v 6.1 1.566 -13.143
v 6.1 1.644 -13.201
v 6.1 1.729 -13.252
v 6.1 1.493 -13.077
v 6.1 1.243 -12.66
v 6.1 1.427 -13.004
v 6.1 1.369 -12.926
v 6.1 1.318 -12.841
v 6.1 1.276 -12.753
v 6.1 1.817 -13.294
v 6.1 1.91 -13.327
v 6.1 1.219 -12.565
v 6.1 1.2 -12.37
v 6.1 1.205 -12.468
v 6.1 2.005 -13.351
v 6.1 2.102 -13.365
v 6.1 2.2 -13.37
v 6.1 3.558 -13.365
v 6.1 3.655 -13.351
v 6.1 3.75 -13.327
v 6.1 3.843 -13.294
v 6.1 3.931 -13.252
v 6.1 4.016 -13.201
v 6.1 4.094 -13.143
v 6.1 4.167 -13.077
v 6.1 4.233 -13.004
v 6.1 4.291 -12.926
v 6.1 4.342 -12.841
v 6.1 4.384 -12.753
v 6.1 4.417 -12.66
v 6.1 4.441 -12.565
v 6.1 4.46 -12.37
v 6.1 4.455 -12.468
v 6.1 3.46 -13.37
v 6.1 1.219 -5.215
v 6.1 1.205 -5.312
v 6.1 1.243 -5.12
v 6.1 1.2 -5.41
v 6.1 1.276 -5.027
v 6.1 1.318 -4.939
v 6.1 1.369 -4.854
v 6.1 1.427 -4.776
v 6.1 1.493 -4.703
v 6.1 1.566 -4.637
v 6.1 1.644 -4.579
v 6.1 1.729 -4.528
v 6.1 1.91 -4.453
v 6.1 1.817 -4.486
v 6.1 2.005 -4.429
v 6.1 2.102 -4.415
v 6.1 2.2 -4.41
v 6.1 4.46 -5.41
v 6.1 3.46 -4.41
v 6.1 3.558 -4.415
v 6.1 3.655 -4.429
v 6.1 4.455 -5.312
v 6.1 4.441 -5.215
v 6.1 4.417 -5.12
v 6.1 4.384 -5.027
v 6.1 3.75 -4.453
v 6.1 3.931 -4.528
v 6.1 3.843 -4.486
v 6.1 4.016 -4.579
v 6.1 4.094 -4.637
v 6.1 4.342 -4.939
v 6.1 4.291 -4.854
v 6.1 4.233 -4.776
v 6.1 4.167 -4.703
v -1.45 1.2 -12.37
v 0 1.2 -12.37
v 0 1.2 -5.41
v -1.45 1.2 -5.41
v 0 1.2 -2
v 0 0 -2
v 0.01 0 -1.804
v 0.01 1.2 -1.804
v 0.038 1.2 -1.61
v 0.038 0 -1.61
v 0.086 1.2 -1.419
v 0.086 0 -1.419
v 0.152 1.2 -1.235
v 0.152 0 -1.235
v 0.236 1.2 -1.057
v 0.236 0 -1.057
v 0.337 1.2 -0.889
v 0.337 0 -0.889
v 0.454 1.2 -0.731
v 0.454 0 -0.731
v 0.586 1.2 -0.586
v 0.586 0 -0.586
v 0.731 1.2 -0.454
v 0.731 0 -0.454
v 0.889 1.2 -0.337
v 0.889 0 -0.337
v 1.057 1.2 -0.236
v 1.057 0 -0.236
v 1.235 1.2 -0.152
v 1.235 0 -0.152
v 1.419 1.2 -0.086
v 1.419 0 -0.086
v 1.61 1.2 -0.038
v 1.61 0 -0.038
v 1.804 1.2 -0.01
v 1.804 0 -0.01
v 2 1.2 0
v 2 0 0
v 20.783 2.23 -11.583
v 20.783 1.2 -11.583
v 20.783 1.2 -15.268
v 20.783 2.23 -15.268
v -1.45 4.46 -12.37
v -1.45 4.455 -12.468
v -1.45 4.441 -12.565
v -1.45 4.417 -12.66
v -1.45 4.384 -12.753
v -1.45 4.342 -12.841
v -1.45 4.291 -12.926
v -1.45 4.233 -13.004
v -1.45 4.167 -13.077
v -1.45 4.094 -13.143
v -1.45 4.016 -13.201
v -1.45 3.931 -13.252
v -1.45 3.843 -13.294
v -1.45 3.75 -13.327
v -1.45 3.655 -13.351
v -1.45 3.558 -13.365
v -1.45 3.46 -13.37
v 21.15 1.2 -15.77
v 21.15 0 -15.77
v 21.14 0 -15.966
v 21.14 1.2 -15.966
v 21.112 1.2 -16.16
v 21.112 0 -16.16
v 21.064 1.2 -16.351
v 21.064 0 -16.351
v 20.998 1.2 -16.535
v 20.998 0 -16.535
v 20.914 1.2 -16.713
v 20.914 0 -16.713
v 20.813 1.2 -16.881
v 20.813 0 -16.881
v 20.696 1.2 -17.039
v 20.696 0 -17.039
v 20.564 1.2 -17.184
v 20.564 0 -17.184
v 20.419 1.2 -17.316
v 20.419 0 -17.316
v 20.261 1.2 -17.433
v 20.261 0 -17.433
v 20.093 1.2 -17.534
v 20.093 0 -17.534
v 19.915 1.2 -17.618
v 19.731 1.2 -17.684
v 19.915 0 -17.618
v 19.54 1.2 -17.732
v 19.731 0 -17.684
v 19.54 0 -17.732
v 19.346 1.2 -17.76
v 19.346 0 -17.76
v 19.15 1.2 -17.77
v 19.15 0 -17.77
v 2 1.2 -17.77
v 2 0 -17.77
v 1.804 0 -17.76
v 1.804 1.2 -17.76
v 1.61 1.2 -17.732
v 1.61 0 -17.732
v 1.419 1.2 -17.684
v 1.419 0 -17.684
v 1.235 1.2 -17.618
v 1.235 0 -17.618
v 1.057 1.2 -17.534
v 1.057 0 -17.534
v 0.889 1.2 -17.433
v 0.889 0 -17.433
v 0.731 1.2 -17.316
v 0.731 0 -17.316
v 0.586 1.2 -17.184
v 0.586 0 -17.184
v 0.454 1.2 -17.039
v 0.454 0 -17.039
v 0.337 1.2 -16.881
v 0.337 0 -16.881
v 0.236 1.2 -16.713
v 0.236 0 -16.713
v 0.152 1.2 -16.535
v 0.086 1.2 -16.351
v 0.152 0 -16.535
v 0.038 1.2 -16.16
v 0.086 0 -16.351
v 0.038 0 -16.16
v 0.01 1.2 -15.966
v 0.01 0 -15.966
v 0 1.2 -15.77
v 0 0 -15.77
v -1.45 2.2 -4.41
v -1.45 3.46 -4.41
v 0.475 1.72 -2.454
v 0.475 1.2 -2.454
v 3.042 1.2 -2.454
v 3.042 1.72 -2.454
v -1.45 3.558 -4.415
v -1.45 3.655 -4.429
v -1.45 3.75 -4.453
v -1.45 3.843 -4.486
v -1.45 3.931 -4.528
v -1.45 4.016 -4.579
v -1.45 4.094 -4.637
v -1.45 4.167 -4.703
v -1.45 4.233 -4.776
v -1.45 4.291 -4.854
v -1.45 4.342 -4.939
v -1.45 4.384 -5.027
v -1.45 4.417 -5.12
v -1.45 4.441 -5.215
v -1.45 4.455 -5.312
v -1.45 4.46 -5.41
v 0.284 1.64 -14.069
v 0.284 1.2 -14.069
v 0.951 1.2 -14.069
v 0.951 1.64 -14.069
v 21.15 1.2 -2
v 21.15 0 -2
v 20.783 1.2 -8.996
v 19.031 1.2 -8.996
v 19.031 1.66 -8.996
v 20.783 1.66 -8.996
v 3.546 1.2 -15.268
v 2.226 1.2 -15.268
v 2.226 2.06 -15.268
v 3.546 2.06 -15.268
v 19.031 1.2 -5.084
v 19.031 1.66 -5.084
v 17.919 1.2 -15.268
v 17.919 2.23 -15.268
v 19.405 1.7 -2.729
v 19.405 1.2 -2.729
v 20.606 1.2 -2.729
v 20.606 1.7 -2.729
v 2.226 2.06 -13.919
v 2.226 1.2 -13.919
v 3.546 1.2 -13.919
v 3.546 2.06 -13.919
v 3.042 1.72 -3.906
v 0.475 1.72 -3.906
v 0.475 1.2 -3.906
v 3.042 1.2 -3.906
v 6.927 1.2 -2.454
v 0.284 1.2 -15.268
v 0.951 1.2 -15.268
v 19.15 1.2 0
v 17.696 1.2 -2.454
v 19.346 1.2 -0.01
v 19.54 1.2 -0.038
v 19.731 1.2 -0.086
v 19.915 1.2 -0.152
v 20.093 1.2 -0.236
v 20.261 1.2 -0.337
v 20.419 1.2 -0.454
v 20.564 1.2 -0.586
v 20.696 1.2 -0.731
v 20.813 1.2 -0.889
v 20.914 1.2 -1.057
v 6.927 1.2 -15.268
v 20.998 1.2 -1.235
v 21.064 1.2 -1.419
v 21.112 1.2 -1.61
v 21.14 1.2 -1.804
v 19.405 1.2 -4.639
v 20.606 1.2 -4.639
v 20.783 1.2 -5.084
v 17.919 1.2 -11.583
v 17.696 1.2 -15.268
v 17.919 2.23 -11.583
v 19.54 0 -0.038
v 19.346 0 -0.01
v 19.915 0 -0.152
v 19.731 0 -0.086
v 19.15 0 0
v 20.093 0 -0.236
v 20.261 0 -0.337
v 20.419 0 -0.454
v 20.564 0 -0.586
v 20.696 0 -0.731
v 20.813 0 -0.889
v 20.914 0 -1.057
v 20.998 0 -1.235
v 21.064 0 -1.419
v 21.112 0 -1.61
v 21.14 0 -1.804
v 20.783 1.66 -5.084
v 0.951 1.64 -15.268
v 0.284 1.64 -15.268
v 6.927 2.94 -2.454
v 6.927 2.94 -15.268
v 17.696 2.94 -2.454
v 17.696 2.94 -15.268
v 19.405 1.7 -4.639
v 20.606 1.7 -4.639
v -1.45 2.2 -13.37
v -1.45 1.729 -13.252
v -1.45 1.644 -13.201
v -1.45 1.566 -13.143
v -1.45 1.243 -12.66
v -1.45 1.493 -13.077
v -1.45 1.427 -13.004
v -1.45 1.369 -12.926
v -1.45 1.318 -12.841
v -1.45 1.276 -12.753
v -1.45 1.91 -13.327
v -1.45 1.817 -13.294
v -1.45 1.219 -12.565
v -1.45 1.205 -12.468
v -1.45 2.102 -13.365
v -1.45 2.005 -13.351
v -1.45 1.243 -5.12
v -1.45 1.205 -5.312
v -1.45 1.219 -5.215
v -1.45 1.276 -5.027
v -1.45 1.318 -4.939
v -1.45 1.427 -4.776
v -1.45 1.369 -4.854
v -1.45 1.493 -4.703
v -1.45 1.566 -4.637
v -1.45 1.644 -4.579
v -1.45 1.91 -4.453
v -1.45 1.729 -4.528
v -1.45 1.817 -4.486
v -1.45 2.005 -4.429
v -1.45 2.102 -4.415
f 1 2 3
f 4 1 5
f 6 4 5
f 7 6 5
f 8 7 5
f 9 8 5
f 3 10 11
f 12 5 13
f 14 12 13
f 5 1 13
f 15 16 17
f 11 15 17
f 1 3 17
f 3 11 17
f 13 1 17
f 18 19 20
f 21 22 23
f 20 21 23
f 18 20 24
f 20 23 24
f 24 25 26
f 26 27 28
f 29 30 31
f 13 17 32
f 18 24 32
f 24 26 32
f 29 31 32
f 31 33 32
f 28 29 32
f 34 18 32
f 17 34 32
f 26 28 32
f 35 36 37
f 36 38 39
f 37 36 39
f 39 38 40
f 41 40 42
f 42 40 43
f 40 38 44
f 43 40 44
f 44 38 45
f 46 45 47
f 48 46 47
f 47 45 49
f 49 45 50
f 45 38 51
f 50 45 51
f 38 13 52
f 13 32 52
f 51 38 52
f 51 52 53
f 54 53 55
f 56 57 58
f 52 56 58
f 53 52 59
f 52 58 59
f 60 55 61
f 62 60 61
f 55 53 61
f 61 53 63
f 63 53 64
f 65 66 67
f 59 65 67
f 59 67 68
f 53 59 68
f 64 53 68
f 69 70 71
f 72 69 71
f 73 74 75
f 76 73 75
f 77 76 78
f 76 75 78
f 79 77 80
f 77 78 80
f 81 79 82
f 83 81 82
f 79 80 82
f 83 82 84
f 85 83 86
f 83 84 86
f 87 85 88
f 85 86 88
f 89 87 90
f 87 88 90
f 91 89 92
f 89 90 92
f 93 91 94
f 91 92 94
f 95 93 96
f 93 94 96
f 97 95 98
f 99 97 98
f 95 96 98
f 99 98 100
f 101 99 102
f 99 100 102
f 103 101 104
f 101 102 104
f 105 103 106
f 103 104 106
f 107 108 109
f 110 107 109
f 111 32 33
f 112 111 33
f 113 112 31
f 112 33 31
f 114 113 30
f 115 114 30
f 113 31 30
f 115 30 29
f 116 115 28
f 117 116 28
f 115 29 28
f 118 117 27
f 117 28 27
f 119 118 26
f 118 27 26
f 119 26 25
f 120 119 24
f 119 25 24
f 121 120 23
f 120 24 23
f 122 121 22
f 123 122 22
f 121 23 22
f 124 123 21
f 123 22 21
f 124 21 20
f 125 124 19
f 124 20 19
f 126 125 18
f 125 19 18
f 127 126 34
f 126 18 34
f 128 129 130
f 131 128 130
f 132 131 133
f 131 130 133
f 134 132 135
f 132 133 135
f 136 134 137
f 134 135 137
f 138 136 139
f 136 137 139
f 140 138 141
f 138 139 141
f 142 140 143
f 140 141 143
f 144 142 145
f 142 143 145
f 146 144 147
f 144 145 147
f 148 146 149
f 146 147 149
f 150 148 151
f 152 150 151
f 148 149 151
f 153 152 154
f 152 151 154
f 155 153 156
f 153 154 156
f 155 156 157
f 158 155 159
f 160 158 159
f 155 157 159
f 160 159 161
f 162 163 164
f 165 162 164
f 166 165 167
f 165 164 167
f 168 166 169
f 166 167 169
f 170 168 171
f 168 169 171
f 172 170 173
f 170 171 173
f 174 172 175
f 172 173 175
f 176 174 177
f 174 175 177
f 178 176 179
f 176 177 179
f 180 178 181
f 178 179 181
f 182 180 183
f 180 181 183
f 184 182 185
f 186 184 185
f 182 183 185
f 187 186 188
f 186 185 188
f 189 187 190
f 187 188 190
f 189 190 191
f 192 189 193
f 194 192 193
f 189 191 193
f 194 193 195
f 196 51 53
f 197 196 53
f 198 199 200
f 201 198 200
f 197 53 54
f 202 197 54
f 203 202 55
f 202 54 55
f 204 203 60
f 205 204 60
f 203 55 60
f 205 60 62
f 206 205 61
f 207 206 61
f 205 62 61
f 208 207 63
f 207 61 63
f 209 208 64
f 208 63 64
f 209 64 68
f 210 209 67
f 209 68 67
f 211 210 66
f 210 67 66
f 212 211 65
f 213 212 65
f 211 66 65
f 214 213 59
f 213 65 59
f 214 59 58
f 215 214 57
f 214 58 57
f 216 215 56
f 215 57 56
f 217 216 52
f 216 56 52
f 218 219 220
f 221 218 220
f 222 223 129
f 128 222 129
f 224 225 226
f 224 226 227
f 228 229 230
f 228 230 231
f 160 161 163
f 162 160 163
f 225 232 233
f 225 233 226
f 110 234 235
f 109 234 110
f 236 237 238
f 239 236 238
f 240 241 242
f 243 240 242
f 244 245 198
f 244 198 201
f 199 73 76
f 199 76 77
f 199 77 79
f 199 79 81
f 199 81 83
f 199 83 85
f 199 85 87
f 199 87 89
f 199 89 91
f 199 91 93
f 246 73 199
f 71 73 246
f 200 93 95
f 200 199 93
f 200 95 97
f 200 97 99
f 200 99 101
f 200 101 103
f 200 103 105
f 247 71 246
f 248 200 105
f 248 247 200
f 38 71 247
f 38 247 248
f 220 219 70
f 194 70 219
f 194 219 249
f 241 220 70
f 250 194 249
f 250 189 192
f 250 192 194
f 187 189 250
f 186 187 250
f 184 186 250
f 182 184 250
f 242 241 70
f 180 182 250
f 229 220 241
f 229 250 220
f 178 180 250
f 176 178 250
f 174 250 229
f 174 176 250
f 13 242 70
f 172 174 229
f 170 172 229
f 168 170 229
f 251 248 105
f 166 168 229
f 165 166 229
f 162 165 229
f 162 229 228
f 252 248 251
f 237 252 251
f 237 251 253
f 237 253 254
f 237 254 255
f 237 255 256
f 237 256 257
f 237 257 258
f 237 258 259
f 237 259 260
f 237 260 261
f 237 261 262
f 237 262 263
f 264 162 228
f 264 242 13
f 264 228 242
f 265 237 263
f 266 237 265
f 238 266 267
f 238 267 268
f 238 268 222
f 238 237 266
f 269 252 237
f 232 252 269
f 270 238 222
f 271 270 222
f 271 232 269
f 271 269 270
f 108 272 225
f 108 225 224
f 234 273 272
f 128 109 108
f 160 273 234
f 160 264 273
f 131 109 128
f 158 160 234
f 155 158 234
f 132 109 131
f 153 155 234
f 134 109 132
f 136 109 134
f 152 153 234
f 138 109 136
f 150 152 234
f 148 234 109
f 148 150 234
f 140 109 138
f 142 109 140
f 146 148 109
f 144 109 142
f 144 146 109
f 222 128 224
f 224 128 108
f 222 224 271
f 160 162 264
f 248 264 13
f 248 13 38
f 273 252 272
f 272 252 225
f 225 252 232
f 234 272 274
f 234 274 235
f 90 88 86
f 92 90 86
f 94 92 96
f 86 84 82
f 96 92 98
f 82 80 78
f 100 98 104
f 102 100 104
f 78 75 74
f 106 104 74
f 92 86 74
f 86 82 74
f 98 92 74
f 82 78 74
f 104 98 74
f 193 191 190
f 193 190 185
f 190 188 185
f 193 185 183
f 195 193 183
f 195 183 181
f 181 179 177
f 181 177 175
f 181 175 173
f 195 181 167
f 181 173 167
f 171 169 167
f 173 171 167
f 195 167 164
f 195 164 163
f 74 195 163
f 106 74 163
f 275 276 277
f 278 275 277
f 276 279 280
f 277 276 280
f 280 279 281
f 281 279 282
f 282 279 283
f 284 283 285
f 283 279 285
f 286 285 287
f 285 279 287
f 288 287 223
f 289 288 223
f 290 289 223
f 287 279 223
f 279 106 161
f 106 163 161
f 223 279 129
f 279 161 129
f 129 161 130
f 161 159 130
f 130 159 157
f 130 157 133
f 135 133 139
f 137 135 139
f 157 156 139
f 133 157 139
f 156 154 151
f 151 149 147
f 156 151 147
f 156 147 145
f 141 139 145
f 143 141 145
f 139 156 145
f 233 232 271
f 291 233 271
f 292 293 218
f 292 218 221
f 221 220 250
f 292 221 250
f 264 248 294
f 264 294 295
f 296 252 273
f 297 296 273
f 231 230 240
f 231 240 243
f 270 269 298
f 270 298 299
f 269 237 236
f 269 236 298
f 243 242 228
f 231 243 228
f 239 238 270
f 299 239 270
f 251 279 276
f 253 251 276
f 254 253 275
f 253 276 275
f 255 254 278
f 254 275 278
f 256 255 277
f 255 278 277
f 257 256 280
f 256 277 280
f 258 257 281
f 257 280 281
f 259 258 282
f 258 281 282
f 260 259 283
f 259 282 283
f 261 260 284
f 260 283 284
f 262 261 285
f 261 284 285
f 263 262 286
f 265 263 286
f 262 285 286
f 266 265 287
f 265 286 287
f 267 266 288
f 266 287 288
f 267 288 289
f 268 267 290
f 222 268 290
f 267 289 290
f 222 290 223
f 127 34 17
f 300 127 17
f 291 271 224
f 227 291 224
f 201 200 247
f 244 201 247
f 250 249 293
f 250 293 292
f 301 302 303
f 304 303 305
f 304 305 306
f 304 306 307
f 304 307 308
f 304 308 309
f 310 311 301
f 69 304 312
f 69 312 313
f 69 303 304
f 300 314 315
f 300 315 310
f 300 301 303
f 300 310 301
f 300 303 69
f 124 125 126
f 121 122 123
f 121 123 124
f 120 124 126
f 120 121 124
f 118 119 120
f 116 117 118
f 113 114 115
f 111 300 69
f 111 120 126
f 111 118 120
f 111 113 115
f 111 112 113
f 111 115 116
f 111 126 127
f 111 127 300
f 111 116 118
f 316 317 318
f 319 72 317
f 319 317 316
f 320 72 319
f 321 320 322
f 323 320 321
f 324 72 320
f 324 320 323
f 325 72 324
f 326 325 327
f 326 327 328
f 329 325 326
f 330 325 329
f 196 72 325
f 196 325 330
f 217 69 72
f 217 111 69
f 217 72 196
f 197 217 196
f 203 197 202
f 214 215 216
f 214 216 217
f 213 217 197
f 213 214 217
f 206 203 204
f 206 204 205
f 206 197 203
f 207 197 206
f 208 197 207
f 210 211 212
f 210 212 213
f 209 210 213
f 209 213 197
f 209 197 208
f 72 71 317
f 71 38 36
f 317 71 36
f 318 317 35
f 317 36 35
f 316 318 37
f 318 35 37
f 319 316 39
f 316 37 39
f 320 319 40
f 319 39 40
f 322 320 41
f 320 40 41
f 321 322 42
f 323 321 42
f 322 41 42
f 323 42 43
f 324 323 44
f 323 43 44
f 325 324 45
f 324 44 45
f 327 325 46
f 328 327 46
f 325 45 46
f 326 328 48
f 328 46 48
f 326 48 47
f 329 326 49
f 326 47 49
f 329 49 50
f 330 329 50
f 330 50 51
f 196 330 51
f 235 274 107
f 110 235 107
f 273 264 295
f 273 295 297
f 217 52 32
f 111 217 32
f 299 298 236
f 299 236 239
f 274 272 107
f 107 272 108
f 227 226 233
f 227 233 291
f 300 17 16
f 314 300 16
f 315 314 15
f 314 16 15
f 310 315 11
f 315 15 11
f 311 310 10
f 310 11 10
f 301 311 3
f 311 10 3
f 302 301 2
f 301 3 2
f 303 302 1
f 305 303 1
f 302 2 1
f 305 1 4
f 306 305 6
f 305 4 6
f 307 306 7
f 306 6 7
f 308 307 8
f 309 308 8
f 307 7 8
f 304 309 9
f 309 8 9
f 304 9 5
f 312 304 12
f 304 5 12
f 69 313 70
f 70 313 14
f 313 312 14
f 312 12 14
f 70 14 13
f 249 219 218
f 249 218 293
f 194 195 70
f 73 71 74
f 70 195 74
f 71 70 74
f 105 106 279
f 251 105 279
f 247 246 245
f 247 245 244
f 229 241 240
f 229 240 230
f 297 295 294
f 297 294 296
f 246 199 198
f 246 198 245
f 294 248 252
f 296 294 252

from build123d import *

# Parameters (mm, degrees)
SKETCH_1_W            = 1.320722759
SKETCH_1_H            = 1.348576416
EXTRUDE_2_DEPTH       = 2.06
SKETCH_1_3_W          = 2.567505851
SKETCH_1_3_H          = 1.451984885
EXTRUDE_3_DEPTH       = 1.72
SKETCH_1_4_W          = 10.768406503
SKETCH_1_4_H          = 12.814051925
EXTRUDE_4_DEPTH       = 2.94
SKETCH_1_5_W          = 1.751728556
SKETCH_1_5_H          = 3.911393899
EXTRUDE_5_DEPTH       = 1.66
SKETCH_1_6_W          = 2.863837954
SKETCH_1_6_H          = 3.684536573
EXTRUDE_6_DEPTH       = 2.23
SKETCH_1_7_W          = 0.666899611
SKETCH_1_7_H          = 1.198197092
EXTRUDE_7_DEPTH       = 1.64
SKETCH_1_8_W          = 1.201543901
SKETCH_1_8_H          = 1.909822412
EXTRUDE_8_DEPTH       = 1.7
EXTRUDE_9_DEPTH       = 1.2
EXTRUDE_10_DEPTH      = 1.45
EXTRUDE_10_DEPTH_BACK = 6.1


with BuildPart() as part:
    # 草图1 → 凸台-拉伸2 (new body)
    with BuildSketch(Plane(origin=(0, 0, 0), x_dir=(1, 0, 0), z_dir=(0, 1, 0))):
        with Locations((2.886090317, 14.593344496)):
            Rectangle(SKETCH_1_W, SKETCH_1_H)
    extrude(amount=EXTRUDE_2_DEPTH)



with BuildPart() as body_2:
    # 草图1<3> → 凸台-拉伸3 (new body)
    with BuildSketch(Plane(origin=(0, 0, 0), x_dir=(1, 0, 0), z_dir=(0, 1, 0))):
        with Locations((1.758272699, 3.179573222)):
            Rectangle(SKETCH_1_3_W, SKETCH_1_3_H)
    extrude(amount=EXTRUDE_3_DEPTH)


with BuildPart() as body_3:
    # 草图1<4> → 凸台-拉伸4 (new body)
    with BuildSketch(Plane(origin=(0, 0, 0), x_dir=(1, 0, 0), z_dir=(0, 1, 0))):
        with Locations((12.311476922, 8.860606741)):
            Rectangle(SKETCH_1_4_W, SKETCH_1_4_H)
    extrude(amount=EXTRUDE_4_DEPTH)


with BuildPart() as body_4:
    # 草图1<5> → 凸台-拉伸5 (new body)
    with BuildSketch(Plane(origin=(0, 0, 0), x_dir=(1, 0, 0), z_dir=(0, 1, 0))):
        with Locations((19.907360624, 7.039973628)):
            Rectangle(SKETCH_1_5_W, SKETCH_1_5_H)
    extrude(amount=EXTRUDE_5_DEPTH)


with BuildPart() as body_5:
    # 草图1<6> → 凸台-拉伸6 (new body)
    with BuildSketch(Plane(origin=(0, 0, 0), x_dir=(1, 0, 0), z_dir=(0, 1, 0))):
        with Locations((19.351305925, 13.425364418)):
            Rectangle(SKETCH_1_6_W, SKETCH_1_6_H)
    extrude(amount=EXTRUDE_6_DEPTH)


with BuildPart() as body_6:
    # 草图1<7> → 凸台-拉伸7 (new body)
    with BuildSketch(Plane(origin=(0, 0, 0), x_dir=(1, 0, 0), z_dir=(0, 1, 0))):
        with Locations((0.617323995, 14.668534158)):
            Rectangle(SKETCH_1_7_W, SKETCH_1_7_H)
    extrude(amount=EXTRUDE_7_DEPTH)


with BuildPart() as body_7:
    # 草图1<8> → 凸台-拉伸8 (new body)
    with BuildSketch(Plane(origin=(0, 0, 0), x_dir=(1, 0, 0), z_dir=(0, 1, 0))):
        with Locations((20.00563527, 3.683898)):
            Rectangle(SKETCH_1_8_W, SKETCH_1_8_H)
    extrude(amount=EXTRUDE_8_DEPTH)


with BuildPart() as part_1:
    add(part.part)

    add(body_2.part)  # 凸台-拉伸9 merges body 2

    add(body_3.part)  # 凸台-拉伸9 merges body 3

    add(body_4.part)  # 凸台-拉伸9 merges body 4

    add(body_5.part)  # 凸台-拉伸9 merges body 5

    add(body_6.part)  # 凸台-拉伸9 merges body 6

    add(body_7.part)  # 凸台-拉伸9 merges body 7
    # 草图1<9> → 凸台-拉伸9 (add)
    with BuildSketch(Plane(origin=(0, 0, 0), x_dir=(1, 0, 0), z_dir=(0, 1, 0))):
        with BuildLine():
            Line((2, 0), (19.15, 0))
            ThreePointArc((19.15, 0), (20.564213562, 0.585786438), (21.15, 2))
            Line((21.15, 2), (21.15, 15.77))
            ThreePointArc((21.15, 15.77), (20.564213562, 17.184213562), (19.15, 17.77))
            Line((19.15, 17.77), (2, 17.77))
            ThreePointArc((2, 17.77), (0.585786438, 17.184213562), (0, 15.77))
            Line((0, 15.77), (0, 2))
            ThreePointArc((0, 2), (0.585786438, 0.585786438), (2, 0))
        make_face()
    extrude(amount=EXTRUDE_9_DEPTH)

    # 草图4 → 凸台-拉伸10 (add, two sides: drawn at the far end of the back side and taken through both)
    with BuildSketch(Plane.ZY.offset(-EXTRUDE_10_DEPTH_BACK)):
        with BuildLine():
            Line((-12.37, 1.2), (-5.41, 1.2))
            ThreePointArc((-5.41, 1.2), (-4.702893219, 1.492893219), (-4.41, 2.2))
            Line((-4.41, 2.2), (-4.41, 3.46))
            ThreePointArc((-4.41, 3.46), (-4.702893219, 4.167106781), (-5.41, 4.46))
            Line((-5.41, 4.46), (-12.37, 4.46))
            ThreePointArc((-12.37, 4.46), (-13.077106781, 4.167106781), (-13.37, 3.46))
            Line((-13.37, 3.46), (-13.37, 2.2))
            ThreePointArc((-13.37, 2.2), (-13.077106781, 1.492893219), (-12.37, 1.2))
        make_face()
    extrude(amount=EXTRUDE_10_DEPTH + EXTRUDE_10_DEPTH_BACK)


solid = part_1.part
